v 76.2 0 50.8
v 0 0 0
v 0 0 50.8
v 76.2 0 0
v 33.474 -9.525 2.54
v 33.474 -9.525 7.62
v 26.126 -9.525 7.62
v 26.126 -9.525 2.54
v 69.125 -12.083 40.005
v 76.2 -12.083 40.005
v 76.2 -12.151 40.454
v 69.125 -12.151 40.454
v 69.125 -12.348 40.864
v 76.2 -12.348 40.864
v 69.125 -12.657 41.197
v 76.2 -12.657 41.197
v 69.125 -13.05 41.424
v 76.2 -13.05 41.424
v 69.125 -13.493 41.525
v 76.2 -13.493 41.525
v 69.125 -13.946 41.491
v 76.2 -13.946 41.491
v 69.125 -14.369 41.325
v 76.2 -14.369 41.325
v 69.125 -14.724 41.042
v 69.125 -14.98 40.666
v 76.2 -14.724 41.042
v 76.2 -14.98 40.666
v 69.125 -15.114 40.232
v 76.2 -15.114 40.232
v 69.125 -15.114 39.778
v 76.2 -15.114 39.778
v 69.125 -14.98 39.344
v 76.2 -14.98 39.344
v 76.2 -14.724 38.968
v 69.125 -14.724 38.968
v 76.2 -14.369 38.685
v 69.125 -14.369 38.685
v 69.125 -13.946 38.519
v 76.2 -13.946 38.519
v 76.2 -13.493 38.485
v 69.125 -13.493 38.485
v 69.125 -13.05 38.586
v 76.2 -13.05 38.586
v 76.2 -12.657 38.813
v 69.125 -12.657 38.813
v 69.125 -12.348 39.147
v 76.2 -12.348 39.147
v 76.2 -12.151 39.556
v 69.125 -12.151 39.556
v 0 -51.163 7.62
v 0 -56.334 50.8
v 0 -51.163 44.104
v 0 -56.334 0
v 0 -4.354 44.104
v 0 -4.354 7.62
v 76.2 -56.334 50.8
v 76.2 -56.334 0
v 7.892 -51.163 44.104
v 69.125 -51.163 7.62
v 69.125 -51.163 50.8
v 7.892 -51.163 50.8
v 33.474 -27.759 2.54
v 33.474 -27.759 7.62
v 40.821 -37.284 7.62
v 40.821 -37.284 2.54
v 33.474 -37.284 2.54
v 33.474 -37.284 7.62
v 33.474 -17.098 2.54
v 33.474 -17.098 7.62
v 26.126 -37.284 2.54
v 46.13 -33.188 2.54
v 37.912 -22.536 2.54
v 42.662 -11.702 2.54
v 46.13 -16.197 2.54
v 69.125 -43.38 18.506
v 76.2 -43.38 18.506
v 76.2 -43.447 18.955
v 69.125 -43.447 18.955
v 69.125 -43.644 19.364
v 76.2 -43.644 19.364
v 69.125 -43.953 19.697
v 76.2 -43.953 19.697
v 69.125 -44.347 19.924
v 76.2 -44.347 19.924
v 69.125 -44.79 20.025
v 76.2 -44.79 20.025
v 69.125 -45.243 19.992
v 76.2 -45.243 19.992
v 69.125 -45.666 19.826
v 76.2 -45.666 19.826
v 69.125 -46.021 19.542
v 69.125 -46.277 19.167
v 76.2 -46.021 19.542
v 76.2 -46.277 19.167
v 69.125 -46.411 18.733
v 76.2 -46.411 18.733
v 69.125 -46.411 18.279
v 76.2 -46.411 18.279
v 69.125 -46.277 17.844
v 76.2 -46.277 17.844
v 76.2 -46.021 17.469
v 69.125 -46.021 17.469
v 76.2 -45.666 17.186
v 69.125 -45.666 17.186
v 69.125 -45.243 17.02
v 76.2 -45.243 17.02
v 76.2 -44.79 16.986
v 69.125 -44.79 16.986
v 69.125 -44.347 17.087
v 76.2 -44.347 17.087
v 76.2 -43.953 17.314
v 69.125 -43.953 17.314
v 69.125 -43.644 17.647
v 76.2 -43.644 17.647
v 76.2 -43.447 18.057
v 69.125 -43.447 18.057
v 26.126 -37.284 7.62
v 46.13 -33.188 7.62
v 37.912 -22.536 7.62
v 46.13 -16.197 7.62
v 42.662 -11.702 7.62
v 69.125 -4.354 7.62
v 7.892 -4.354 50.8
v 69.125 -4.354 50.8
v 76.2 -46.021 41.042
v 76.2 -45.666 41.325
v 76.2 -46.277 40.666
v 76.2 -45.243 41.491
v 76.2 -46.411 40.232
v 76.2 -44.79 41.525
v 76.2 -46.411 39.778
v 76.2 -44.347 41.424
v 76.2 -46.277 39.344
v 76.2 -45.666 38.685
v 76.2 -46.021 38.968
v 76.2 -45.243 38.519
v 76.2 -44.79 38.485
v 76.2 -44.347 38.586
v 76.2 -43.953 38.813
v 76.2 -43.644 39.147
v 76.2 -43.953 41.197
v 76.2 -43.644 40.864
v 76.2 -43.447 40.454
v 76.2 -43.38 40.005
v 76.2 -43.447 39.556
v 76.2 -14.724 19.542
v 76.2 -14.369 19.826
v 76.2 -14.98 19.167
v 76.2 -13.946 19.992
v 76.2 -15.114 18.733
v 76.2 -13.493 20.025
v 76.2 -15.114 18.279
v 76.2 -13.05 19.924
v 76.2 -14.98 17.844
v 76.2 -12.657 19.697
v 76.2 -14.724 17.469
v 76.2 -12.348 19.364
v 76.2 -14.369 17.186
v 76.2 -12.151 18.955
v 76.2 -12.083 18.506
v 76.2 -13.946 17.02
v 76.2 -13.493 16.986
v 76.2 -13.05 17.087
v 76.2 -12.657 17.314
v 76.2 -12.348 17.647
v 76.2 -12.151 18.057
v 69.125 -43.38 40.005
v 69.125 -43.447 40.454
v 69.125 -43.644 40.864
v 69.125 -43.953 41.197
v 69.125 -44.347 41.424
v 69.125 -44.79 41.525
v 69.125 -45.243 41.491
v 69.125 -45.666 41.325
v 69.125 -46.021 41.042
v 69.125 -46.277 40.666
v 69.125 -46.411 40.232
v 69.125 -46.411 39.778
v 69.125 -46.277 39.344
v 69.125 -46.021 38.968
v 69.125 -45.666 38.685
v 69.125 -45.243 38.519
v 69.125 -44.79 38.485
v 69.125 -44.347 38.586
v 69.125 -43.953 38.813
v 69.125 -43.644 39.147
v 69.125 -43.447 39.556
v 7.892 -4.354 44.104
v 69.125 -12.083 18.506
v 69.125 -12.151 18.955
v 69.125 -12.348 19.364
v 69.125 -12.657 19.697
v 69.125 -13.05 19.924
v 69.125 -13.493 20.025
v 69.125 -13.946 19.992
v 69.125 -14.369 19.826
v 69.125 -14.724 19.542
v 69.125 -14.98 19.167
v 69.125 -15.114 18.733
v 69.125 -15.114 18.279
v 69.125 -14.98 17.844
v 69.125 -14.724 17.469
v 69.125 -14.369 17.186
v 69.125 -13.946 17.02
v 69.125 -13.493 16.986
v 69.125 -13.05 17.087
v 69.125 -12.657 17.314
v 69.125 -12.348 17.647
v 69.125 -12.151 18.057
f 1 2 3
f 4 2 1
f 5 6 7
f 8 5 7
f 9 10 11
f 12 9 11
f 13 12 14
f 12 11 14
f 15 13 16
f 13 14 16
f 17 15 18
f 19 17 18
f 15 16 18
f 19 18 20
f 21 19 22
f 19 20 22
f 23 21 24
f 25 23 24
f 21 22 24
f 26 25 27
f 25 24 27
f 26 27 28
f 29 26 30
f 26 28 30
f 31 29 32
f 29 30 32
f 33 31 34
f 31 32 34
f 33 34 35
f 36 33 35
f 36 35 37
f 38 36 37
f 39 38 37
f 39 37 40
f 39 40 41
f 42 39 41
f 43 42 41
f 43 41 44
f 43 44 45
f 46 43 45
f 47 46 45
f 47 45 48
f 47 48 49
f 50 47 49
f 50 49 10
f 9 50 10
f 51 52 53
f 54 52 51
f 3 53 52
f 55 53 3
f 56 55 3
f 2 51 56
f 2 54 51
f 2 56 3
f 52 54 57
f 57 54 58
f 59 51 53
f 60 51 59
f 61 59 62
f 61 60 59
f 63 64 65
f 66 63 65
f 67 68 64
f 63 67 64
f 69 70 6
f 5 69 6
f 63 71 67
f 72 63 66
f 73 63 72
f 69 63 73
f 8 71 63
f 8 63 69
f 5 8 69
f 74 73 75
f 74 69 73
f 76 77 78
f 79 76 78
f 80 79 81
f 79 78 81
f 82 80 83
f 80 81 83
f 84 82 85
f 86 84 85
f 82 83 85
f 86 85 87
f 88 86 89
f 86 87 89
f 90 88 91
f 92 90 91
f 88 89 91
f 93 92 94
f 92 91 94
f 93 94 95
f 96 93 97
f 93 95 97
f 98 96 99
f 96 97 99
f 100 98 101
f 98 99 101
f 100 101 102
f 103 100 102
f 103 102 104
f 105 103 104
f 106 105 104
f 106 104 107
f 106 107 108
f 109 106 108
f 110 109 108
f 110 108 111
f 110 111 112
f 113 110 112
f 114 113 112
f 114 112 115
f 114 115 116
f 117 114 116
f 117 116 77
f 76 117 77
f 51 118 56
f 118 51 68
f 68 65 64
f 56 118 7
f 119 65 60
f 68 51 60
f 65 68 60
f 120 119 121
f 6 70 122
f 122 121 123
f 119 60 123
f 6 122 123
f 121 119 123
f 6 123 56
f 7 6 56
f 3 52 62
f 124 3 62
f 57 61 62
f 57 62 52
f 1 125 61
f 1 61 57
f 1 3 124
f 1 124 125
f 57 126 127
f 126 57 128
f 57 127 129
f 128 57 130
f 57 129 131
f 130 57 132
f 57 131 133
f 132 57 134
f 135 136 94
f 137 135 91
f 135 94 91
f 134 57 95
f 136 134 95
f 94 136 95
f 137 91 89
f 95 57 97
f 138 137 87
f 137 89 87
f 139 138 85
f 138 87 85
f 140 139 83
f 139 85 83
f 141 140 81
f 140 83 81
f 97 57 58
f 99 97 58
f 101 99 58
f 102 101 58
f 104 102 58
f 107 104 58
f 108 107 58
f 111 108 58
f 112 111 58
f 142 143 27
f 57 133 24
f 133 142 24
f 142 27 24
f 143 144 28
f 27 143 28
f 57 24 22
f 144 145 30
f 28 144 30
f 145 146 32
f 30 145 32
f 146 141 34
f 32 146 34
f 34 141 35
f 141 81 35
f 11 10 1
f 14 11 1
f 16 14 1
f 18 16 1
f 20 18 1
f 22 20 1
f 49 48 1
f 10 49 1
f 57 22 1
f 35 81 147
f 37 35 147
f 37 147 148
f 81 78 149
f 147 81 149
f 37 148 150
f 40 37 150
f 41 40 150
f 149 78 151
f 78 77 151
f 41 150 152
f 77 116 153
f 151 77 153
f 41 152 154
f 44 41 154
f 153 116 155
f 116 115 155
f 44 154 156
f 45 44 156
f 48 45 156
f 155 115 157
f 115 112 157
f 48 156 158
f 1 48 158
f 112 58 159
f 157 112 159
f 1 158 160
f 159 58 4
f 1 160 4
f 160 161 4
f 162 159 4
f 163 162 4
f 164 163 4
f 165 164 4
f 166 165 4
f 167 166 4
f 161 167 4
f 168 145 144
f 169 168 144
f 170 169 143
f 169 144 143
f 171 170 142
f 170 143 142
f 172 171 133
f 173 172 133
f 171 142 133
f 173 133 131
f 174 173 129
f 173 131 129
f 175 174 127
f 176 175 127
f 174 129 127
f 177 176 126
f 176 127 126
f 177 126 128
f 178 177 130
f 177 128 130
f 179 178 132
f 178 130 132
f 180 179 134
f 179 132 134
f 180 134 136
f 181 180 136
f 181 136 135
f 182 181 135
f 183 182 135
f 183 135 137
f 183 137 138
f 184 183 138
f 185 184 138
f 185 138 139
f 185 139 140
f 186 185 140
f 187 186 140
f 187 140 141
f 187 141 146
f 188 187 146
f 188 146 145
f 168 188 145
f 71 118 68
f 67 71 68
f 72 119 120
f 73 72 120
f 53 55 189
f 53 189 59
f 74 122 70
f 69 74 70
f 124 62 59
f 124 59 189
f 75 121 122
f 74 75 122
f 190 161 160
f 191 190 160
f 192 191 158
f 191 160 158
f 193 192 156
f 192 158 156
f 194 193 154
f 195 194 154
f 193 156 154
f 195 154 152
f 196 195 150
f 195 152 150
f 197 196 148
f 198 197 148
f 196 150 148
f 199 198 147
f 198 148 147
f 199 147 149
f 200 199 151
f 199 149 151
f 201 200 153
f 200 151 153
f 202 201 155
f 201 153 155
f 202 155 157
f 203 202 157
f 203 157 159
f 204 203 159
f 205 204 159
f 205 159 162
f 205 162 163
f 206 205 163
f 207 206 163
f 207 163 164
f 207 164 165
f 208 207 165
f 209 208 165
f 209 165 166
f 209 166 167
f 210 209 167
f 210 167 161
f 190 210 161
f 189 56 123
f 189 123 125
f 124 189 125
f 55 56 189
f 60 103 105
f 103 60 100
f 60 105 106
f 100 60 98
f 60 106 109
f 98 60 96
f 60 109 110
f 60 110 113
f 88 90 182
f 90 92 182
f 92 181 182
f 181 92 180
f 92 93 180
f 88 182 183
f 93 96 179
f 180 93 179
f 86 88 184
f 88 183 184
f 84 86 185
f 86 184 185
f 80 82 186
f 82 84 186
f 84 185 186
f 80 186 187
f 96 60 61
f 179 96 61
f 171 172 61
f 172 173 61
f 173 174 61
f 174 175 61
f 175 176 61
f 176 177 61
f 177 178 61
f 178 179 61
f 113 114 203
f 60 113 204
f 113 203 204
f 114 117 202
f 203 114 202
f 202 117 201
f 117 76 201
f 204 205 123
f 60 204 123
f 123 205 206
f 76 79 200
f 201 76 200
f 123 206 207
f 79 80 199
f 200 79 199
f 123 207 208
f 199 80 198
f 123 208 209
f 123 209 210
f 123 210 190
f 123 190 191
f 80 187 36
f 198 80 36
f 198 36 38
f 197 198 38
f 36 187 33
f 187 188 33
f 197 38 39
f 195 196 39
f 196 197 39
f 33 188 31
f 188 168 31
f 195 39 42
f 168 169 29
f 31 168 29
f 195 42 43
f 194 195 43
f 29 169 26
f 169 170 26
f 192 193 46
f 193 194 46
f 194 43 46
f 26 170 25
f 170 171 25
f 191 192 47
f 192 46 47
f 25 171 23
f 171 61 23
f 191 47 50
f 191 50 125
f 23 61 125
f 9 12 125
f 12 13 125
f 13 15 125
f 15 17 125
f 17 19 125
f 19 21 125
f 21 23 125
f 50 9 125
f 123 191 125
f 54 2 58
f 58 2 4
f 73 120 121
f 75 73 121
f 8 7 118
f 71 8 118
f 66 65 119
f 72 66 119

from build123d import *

# Parameters (mm, degrees)
F0_W      = 76.2000009418
F0_H      = 56.3335753977
F1_DEPTH  = 50.8
F2_W      = 61.2327515673
F2_H      = 46.8085720204
F3_DEPTH  = 43.18
F4_W      = 46.8085720204
F4_H      = 21.59
F5_DEPTH  = 25.4
F6_W      = 46.8085720204
F6_H      = 9.227910161
F7_DEPTH  = 25.4
F9_DEPTH  = 5.08
F10_R     = 1.524
F11_DEPTH = 25.4
F12_W     = 46.8085720204
F12_H     = 5.665987947
F13_DEPTH = 25.4


with BuildPart() as f1:
    # F0 (on Top) → F1 (new body)
    with BuildSketch(Plane.XY):
        with Locations((38.1000004709, -28.1667876989)):
            Rectangle(F0_W, F0_H)
    extrude(amount=F1_DEPTH)

    # F2 (on face) → F3 (cut)
    with BuildSketch(Plane.XY.offset(50.8)):
        with Locations((38.5085178336, -27.7585715521)):
            Rectangle(F2_W, F2_H)
    extrude(amount=-F3_DEPTH, mode=Mode.SUBTRACT)

    # F4 (on face) → F5 (cut)
    with BuildSketch(Plane.YZ.offset(7.89214205)):
        with Locations((-27.7585715521, 18.415)):
            Rectangle(F4_W, F4_H)
    extrude(amount=-F5_DEPTH, mode=Mode.SUBTRACT)

    # F6 (on face) → F7 (cut)
    with BuildSketch(Plane(origin=(0, 0, 0), x_dir=(0, -1, 0), z_dir=(-1, 0, 0))):
        with Locations((27.7585715521, 33.8239550805)):
            Rectangle(F6_W, F6_H)
    extrude(amount=-F7_DEPTH, mode=Mode.SUBTRACT)

    # F8 (on face) → F9 (cut)
    with BuildSketch(Plane.XY.offset(7.62)):
        Polygon((26.1257160455, -9.5250001177), (26.1257160455, -16.6007149965), (26.1257160455, -37.2835732996), (33.4735698998, -37.2835732996), (33.4735698998, -27.7585722506), (40.821429342, -37.2835732996), (46.1298863749, -33.1884770438), (37.9123979826, -22.5361794362), (46.1298863749, -16.1969728194), (42.6624452598, -11.7021426558), (33.4735698998, -17.097555101), (33.4735698998, -9.5250001177), align=None)
    extrude(amount=-F9_DEPTH, mode=Mode.SUBTRACT)

    # F10 (on face) → F11 (cut)
    with BuildSketch(Plane.YZ.offset(76.2000009418)):
        with Locations((-44.9035726488, 18.5057148337)):
            Circle(F10_R)
        with Locations((-13.6071434245, 40.0050021708)):
            Circle(F10_R)
        with Locations((-44.9035726488, 40.0050021708)):
            Circle(F10_R)
        with Locations((-13.6071434245, 18.5057148337)):
            Circle(F10_R)
    extrude(amount=-F11_DEPTH, mode=Mode.SUBTRACT)

    # F12 (on face) → F13 (cut)
    with BuildSketch(Plane(origin=(0, 0, 0), x_dir=(0, -1, 0), z_dir=(-1, 0, 0))):
        with Locations((27.7585715521, 41.2709041345)):
            Rectangle(F12_W, F12_H)
    extrude(amount=-F13_DEPTH, mode=Mode.SUBTRACT)


solid = f1.part
